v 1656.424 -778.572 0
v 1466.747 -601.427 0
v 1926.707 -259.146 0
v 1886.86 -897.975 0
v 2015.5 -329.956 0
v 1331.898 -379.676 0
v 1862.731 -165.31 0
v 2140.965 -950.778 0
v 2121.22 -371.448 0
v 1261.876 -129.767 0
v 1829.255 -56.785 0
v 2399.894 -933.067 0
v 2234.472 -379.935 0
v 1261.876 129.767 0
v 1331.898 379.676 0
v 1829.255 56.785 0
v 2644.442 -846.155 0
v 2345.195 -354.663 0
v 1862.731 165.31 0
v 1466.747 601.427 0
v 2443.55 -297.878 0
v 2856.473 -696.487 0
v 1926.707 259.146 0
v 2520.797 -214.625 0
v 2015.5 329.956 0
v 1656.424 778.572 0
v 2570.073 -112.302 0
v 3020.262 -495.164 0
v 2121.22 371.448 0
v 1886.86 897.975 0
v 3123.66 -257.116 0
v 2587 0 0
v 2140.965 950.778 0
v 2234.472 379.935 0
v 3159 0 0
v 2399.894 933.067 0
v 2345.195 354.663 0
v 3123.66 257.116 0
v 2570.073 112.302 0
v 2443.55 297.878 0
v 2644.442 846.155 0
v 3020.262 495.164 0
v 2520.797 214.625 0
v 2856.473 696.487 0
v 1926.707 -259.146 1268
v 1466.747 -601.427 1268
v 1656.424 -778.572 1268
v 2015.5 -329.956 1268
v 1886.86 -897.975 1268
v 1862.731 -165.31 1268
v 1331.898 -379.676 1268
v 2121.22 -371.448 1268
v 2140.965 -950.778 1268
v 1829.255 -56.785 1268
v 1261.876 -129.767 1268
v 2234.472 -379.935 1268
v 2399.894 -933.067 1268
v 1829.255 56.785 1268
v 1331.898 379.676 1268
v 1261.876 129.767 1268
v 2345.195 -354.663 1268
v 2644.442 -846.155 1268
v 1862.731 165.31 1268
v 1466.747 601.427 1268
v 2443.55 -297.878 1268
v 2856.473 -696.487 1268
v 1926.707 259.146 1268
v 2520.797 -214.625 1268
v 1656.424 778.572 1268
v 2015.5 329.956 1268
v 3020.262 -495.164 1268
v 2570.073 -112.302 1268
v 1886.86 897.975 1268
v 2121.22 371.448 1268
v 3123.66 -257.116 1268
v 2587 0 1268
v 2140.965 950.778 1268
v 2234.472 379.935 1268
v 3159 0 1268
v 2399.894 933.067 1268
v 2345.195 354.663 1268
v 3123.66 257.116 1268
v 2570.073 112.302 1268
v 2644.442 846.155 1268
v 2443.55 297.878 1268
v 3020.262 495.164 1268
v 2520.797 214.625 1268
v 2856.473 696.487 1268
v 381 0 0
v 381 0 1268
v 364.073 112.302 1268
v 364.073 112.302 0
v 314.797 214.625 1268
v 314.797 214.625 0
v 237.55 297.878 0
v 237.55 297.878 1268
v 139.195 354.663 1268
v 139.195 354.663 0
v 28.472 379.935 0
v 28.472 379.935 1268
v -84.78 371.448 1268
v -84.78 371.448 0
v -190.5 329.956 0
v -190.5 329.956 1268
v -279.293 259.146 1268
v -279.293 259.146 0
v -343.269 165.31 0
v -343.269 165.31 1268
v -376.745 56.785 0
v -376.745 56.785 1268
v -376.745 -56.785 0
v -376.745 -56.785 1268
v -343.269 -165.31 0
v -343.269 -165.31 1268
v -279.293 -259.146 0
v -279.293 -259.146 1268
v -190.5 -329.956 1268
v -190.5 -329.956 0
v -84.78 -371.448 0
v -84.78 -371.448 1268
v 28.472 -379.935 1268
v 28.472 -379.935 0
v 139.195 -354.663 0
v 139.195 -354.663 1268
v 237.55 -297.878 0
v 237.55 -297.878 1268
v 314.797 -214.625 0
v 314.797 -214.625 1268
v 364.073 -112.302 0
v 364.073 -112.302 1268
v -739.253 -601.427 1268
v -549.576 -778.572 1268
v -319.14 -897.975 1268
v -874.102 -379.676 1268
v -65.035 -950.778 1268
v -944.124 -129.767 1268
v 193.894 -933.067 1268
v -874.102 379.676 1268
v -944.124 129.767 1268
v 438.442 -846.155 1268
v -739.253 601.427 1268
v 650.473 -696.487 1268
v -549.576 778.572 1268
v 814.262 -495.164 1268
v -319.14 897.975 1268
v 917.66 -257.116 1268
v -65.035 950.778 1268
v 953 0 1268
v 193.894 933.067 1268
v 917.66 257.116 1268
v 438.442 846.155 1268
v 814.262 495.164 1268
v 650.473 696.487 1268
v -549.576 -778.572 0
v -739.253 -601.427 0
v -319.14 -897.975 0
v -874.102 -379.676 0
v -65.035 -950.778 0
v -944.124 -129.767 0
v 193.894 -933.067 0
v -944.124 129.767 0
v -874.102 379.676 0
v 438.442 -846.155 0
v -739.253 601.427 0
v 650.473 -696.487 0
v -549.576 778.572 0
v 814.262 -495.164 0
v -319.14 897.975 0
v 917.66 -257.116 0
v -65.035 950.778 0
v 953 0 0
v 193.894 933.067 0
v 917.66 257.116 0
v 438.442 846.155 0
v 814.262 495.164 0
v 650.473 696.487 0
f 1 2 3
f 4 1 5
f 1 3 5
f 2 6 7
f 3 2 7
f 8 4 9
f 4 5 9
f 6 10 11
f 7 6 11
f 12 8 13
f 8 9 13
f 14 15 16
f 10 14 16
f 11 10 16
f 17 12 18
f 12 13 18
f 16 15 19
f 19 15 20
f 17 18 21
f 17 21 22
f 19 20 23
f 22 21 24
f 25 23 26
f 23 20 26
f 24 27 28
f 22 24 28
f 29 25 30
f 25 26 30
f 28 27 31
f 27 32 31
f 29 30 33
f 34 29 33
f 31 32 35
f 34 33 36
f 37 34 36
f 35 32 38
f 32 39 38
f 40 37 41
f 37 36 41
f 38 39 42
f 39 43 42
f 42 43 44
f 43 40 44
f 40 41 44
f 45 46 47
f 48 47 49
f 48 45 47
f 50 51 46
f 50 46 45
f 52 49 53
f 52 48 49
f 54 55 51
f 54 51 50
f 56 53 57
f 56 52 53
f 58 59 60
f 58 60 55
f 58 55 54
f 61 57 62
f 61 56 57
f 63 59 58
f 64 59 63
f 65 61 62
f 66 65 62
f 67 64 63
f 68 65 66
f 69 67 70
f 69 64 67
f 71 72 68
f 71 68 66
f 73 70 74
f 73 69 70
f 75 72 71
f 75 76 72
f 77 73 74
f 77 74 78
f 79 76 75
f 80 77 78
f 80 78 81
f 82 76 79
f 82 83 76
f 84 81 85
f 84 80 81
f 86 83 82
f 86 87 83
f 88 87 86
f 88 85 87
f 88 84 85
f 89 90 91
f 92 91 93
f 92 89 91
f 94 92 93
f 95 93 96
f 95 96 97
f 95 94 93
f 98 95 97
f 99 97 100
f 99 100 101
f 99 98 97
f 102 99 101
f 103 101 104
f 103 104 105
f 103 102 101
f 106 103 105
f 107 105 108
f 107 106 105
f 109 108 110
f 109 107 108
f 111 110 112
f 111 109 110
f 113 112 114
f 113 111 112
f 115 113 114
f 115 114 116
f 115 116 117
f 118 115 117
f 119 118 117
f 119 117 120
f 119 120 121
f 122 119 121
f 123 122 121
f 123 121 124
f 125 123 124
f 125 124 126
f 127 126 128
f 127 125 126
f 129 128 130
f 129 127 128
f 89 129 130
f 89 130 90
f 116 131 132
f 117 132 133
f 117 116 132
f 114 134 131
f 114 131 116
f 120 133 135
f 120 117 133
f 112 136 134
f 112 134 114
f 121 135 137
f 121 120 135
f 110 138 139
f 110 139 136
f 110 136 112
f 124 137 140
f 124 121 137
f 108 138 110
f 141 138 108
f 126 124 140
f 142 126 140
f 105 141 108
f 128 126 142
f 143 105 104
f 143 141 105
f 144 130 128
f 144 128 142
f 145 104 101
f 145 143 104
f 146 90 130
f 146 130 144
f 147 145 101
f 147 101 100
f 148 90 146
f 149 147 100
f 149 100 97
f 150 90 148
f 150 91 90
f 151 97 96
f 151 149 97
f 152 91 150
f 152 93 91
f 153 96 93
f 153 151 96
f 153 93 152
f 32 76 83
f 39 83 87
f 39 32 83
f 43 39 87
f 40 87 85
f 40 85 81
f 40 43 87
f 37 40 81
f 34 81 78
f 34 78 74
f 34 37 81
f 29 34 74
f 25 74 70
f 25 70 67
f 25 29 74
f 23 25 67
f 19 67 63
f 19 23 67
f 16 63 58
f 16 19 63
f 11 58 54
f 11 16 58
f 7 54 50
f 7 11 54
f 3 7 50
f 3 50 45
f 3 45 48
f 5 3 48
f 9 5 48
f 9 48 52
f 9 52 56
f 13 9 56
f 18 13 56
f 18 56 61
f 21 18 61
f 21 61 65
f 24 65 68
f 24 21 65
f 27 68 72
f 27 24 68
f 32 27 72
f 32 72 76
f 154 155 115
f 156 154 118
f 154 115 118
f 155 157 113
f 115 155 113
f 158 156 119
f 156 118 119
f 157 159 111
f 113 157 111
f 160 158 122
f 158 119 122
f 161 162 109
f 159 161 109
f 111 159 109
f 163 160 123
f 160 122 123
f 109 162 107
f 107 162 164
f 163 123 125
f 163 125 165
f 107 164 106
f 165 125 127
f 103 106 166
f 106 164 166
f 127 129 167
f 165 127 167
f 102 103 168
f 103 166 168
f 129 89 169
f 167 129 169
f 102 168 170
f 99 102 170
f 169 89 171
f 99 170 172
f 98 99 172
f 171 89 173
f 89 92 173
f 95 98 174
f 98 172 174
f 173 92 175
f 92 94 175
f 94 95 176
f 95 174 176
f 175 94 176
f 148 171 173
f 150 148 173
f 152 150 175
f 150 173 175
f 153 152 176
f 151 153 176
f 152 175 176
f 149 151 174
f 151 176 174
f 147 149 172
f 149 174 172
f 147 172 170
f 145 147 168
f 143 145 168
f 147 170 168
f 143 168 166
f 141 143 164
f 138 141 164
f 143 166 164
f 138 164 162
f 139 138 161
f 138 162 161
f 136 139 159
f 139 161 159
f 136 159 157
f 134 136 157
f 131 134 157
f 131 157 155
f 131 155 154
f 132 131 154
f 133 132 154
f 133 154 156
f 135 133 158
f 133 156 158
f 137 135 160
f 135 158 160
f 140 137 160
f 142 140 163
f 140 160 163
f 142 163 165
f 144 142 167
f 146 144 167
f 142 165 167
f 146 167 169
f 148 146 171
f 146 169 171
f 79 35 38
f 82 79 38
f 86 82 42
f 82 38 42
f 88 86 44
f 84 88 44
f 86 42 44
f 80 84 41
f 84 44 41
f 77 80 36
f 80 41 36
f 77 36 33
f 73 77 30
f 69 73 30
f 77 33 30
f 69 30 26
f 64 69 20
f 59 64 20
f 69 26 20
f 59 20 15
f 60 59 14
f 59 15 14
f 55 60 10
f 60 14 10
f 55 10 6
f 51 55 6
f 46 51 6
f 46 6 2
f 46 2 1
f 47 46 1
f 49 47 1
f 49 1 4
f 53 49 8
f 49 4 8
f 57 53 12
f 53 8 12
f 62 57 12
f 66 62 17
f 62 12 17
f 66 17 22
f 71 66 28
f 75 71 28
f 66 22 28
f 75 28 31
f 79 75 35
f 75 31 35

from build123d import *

# Parameters (mm, degrees)
SZKIC1_R                      = 953
SZKIC1_R_2                    = 381
DODANIE_WYCI_GNI_CIE2_DEPTH   = 1268
DODANIE_WYCI_GNI_CIE2_2_DEPTH = 1268


with BuildPart() as part:
    # Szkic1 → Dodanie-wyciągnięcie2 (new body)
    with BuildSketch(Plane.XY):
        with Locations((2206, 0)):
            Circle(SZKIC1_R)
        with Locations((2206, 0)):
            Circle(SZKIC1_R_2, mode=Mode.SUBTRACT)
    extrude(amount=DODANIE_WYCI_GNI_CIE2_DEPTH)


with BuildPart() as body_2:
    # Szkic1 → Dodanie-wyci_gni_cie2 2 (new body)
    with BuildSketch(Plane.XY):
        Circle(SZKIC1_R)
        Circle(SZKIC1_R_2, mode=Mode.SUBTRACT)
    extrude(amount=DODANIE_WYCI_GNI_CIE2_2_DEPTH)


solid = Compound([part.part, body_2.part])
